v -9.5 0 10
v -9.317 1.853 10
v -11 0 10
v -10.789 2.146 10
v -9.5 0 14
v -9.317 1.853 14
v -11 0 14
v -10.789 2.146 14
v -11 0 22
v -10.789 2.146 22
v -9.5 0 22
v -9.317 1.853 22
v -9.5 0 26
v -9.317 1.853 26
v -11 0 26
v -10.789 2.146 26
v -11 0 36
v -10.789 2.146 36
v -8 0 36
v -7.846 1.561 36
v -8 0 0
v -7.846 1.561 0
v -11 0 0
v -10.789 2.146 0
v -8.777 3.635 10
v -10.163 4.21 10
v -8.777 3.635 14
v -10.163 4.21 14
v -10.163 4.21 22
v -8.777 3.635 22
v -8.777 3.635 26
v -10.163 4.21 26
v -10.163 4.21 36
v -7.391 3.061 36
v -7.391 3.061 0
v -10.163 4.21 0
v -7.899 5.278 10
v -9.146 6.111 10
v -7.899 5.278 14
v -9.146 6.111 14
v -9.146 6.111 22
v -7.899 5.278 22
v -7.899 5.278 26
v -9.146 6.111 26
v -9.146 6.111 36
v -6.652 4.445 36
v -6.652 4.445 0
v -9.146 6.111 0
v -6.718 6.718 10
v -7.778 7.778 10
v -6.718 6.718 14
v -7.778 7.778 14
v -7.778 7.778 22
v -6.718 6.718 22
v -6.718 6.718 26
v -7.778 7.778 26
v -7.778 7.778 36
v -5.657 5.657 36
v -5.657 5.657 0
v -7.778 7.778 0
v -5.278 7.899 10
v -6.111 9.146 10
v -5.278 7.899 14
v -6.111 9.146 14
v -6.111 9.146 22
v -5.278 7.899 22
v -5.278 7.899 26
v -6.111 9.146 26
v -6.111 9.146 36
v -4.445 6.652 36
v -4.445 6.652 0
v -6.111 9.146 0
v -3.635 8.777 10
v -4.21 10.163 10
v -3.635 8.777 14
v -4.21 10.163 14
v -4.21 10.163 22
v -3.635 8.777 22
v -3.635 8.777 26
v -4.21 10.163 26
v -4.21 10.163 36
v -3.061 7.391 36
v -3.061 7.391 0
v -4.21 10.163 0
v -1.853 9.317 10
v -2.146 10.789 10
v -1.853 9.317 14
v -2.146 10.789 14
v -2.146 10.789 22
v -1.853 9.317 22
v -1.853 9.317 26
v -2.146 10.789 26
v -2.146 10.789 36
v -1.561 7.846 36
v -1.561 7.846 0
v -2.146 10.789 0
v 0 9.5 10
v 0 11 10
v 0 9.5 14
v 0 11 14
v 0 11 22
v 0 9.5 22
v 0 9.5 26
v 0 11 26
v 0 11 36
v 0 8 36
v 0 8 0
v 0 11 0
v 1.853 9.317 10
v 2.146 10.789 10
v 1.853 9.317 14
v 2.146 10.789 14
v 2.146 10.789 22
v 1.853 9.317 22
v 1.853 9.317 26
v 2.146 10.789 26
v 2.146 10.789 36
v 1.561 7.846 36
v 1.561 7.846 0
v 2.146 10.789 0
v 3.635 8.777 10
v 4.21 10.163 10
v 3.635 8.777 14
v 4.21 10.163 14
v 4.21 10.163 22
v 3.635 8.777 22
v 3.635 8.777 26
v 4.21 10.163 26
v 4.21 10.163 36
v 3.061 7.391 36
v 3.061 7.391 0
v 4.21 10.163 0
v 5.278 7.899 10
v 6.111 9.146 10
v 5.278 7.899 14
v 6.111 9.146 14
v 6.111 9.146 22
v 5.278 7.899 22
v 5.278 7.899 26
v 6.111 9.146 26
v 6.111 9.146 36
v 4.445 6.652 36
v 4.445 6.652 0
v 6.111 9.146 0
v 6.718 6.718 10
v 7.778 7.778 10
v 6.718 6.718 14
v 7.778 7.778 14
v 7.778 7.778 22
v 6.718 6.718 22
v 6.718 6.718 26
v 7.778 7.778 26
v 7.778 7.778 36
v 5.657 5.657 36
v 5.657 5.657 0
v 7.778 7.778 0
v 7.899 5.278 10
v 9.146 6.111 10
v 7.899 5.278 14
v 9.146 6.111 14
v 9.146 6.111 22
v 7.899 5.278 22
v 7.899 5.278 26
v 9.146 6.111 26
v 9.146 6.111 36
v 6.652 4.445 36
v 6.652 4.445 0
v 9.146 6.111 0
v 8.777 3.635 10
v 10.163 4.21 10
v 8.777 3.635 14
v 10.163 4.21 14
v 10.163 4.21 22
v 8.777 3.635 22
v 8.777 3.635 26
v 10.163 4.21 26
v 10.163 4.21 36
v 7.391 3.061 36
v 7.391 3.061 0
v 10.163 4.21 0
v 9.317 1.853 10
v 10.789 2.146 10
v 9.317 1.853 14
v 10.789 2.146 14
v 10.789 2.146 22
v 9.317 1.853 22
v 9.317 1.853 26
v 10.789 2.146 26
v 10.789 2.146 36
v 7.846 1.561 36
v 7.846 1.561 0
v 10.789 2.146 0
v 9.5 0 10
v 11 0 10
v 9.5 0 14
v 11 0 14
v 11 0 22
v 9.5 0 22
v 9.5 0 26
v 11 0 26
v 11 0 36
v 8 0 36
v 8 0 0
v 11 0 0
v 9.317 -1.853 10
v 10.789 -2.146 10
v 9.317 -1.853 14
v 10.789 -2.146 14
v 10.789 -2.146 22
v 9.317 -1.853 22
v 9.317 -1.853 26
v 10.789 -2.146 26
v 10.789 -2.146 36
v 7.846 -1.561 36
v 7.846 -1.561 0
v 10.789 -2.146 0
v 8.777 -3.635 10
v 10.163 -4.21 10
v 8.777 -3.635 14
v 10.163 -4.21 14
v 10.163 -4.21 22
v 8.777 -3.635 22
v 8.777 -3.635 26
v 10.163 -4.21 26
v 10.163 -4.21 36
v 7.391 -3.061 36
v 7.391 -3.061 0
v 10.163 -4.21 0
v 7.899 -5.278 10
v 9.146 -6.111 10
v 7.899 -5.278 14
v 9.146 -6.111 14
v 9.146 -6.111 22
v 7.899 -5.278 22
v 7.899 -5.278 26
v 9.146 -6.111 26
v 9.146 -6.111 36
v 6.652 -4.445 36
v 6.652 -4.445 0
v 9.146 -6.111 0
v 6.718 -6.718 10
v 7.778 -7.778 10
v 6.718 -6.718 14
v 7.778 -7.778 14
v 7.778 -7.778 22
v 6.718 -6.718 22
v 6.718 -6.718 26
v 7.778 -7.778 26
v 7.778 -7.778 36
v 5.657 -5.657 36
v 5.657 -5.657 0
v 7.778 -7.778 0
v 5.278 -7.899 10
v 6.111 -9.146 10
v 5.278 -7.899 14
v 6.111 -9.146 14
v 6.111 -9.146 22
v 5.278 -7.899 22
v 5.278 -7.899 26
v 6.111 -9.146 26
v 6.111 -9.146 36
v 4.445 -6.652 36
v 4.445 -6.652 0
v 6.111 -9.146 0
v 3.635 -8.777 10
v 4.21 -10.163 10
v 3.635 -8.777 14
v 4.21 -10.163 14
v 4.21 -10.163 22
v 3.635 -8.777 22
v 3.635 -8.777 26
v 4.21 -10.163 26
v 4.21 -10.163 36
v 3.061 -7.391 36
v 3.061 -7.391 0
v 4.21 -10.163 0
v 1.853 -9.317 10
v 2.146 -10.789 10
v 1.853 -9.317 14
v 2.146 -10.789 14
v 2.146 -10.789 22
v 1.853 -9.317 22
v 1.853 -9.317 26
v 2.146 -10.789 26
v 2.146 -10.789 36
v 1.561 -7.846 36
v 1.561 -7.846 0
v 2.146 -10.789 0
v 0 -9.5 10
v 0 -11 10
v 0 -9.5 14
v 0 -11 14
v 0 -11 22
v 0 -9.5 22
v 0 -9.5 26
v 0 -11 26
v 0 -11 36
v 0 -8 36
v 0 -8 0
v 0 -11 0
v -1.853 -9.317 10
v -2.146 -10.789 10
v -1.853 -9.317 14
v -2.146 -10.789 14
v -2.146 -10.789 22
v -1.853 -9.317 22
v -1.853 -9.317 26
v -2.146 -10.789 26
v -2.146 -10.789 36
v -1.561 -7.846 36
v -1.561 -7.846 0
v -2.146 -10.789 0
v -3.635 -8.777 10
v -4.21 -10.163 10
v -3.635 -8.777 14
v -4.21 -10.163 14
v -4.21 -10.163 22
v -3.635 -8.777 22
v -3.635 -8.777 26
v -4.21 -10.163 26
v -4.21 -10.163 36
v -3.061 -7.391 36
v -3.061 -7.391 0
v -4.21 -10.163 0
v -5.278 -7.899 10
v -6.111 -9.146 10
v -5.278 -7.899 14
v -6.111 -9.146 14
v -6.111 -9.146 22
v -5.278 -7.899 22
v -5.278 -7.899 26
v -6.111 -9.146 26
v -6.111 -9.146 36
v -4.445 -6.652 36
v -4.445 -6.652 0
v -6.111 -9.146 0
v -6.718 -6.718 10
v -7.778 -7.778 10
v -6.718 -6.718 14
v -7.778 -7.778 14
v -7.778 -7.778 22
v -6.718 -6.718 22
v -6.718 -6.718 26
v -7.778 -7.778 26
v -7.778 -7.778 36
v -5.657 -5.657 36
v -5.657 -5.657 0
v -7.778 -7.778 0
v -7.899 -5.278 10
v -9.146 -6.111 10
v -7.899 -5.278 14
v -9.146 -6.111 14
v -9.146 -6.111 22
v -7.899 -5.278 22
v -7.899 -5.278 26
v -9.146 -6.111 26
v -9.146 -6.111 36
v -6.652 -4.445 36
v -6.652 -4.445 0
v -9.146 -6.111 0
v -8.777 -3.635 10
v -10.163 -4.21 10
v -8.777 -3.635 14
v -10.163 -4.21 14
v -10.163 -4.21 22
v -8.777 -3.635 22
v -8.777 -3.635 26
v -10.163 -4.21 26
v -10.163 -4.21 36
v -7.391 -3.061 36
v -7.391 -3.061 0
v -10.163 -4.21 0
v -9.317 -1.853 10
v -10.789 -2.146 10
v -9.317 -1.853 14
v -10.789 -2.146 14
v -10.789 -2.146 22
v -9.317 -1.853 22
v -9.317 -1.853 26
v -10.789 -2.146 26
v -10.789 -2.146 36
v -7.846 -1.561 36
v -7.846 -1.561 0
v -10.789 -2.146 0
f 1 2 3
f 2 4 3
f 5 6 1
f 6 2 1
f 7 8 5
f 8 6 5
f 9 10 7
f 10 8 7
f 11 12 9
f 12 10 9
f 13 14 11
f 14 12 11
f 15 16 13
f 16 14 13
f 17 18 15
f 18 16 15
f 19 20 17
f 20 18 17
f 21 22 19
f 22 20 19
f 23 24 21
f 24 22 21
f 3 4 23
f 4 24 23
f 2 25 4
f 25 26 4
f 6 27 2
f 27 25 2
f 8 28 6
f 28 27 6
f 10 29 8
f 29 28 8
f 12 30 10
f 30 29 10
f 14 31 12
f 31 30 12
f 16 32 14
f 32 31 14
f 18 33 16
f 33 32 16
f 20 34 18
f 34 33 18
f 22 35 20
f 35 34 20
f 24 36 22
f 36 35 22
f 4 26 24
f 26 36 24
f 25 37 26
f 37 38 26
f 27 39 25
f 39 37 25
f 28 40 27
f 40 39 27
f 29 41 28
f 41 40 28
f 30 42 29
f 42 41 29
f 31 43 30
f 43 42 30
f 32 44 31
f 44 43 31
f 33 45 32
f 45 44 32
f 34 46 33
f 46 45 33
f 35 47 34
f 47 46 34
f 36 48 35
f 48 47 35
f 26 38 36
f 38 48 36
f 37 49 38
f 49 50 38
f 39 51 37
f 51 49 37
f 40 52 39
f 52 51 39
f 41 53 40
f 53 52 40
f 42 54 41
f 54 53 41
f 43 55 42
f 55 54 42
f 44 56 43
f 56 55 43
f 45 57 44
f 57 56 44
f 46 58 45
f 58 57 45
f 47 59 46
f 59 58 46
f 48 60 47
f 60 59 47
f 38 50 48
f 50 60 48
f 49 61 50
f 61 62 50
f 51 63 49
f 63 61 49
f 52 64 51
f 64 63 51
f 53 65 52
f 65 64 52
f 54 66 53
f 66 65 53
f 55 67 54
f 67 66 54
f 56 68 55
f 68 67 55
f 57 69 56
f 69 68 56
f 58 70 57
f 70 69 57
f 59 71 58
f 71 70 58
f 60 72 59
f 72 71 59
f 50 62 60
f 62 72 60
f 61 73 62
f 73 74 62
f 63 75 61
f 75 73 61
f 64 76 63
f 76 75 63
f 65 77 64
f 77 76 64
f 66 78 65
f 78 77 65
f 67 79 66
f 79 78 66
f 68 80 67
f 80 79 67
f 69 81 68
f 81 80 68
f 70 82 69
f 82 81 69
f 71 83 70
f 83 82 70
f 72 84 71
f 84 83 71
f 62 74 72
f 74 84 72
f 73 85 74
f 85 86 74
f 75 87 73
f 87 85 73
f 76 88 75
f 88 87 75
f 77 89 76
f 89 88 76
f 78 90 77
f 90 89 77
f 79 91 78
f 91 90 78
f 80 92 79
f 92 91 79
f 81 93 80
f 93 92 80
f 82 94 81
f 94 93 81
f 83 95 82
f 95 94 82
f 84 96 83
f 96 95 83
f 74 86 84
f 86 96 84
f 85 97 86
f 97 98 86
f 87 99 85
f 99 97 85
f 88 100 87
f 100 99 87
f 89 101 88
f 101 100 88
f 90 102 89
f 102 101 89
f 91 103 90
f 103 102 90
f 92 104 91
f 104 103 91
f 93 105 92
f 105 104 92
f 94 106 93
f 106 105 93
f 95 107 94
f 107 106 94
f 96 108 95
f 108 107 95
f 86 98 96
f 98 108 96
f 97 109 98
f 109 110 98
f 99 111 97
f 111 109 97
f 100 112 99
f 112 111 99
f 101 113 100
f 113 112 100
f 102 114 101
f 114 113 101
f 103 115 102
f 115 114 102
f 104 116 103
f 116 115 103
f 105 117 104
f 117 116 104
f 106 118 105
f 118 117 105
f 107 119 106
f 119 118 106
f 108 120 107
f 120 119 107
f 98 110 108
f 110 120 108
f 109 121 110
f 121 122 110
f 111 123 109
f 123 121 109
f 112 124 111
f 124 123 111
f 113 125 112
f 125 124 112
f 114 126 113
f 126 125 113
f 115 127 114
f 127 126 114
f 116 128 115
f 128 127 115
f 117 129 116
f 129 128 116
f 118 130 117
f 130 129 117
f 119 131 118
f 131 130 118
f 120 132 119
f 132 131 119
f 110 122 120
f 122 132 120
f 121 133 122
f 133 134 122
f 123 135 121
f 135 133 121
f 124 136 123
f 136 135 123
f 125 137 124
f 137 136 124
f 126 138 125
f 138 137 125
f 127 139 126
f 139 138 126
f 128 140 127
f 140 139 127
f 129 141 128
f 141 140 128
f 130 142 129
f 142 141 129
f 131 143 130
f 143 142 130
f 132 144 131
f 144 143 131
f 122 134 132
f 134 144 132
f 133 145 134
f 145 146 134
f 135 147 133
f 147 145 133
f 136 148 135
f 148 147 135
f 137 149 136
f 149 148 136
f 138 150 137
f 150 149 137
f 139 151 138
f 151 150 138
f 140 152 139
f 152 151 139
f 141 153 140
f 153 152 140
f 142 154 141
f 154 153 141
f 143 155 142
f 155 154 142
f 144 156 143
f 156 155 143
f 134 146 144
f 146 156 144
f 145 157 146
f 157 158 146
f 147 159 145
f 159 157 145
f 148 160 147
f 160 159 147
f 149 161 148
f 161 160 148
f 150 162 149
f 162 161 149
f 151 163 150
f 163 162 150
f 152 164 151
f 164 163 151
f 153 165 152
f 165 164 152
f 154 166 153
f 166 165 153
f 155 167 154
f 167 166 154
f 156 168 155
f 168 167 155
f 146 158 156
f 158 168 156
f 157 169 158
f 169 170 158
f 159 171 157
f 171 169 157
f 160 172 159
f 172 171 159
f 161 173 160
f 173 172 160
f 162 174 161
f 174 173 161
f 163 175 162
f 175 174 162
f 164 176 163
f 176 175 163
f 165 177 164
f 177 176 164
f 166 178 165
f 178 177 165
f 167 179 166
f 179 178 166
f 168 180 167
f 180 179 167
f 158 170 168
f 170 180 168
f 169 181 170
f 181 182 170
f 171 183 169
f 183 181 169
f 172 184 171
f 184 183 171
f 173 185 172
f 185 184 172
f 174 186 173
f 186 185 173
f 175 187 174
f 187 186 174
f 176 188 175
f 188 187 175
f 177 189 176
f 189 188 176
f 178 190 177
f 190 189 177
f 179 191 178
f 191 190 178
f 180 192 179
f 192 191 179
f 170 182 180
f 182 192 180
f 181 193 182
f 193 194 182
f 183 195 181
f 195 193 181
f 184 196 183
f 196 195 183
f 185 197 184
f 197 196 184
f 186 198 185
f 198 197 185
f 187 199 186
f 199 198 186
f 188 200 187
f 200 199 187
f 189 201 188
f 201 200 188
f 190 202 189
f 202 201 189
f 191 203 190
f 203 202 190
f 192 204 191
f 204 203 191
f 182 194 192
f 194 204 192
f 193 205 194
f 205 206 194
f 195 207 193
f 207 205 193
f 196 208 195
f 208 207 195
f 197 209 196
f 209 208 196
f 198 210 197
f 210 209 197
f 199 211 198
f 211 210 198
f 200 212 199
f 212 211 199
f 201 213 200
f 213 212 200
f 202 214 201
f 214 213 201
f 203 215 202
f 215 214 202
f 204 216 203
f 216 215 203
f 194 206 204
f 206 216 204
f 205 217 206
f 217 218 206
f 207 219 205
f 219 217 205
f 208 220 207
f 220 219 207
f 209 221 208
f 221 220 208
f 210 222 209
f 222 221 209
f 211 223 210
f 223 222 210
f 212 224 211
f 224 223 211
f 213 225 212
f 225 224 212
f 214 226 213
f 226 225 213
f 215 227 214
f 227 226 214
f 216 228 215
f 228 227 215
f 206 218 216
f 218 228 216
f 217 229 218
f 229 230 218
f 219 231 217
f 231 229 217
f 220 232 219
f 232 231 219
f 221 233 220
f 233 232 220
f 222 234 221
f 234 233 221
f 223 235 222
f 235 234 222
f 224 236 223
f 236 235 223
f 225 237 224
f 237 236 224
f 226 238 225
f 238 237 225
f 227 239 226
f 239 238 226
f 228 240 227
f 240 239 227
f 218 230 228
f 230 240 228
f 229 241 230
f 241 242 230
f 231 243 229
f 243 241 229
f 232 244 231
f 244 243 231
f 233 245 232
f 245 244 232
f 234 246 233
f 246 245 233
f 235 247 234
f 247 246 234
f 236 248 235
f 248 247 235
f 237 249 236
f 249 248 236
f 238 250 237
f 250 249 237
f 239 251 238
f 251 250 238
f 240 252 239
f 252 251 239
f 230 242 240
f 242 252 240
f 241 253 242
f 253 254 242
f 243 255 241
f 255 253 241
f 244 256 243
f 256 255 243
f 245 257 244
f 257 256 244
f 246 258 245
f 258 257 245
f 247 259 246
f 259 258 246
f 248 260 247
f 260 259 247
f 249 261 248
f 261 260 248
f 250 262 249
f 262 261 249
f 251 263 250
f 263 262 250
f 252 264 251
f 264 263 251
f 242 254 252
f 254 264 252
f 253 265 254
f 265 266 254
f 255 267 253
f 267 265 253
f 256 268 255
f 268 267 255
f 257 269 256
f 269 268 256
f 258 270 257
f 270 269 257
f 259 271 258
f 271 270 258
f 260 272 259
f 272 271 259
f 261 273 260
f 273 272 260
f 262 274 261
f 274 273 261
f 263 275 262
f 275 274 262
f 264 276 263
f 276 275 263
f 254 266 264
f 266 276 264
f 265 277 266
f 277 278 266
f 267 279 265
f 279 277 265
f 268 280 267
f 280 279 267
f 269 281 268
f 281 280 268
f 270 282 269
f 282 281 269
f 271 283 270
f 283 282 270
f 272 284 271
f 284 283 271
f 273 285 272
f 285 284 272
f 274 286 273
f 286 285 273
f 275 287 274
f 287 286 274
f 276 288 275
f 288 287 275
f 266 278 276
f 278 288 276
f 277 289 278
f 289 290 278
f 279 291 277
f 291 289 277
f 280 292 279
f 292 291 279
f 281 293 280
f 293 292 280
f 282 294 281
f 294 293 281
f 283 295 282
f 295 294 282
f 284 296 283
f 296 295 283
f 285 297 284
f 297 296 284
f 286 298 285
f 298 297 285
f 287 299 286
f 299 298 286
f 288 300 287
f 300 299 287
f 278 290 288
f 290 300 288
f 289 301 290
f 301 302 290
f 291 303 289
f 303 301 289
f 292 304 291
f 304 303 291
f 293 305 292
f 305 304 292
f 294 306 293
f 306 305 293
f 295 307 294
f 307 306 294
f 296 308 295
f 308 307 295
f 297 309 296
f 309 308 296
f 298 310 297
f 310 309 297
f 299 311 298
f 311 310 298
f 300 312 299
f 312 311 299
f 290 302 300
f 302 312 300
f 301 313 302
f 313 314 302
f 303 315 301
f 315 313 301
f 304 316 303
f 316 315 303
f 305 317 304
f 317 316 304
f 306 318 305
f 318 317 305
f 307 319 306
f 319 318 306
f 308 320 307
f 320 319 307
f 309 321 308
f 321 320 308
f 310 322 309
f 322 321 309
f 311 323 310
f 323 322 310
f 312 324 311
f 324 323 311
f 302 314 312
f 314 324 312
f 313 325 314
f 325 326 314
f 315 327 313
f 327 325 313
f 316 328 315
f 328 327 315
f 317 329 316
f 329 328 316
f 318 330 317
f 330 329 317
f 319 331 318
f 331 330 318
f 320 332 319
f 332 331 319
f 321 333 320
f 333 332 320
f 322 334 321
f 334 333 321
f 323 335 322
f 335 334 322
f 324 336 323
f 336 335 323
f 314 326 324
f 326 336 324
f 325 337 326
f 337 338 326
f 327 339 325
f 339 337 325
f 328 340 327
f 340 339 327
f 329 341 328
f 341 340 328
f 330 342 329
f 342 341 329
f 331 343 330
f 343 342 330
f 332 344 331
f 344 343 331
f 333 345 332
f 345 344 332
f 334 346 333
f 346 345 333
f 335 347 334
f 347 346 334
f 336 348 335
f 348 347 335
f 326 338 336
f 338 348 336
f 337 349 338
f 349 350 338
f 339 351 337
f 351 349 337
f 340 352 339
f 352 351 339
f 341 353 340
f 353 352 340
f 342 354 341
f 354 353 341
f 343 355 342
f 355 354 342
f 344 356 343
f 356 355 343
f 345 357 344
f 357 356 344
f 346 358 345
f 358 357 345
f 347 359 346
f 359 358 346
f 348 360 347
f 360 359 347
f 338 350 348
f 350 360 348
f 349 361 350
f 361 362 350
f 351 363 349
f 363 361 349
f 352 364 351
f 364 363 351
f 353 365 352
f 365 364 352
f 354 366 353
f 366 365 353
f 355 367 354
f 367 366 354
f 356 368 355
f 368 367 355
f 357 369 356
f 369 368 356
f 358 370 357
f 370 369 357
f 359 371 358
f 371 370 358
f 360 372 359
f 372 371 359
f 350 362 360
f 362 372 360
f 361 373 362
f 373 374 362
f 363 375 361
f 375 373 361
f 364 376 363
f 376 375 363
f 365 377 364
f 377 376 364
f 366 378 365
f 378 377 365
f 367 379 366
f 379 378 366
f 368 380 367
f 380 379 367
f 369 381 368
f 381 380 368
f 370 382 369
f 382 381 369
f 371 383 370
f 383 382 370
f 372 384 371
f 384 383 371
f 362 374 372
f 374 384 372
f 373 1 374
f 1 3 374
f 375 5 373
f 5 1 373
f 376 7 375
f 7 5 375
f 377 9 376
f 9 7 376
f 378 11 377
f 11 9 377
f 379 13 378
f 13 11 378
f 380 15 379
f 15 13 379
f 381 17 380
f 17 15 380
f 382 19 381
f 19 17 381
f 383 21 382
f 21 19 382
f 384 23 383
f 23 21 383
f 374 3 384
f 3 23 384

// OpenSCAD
$fn = 32;

// ----------------------------------------------------------------------
// Grooved revolve: plain_grooves, bore R8
// ----------------------------------------------------------------------

// --- parameters (mm) ---
bore_r = 8;               // bore radius
outer_r = 11;             // outer radius of the body
total_h = 36;             // overall height, Z
wall = 3;                 // radial wall thickness
groove_w = 4;             // groove width
groove_d = 1.5;           // groove depth
grooves = 2;              // number of outer grooves

bbox_x = 2 * outer_r;  // full diameter
bore_d = 2 * bore_r;  // bore diameter
body_d = 2 * outer_r;  // body diameter
revolve_angle = 360;  // full turn around the Z axis

profile = [[8, 0], [11, 0], [11, 10], [9.5, 10], [9.5, 14], [11, 14], [11, 22], [9.5, 22], [9.5, 26], [11, 26], [11, 36], [8, 36]];  // primary outline, 12 points, counter clockwise

// --- the one profile operation ---
rotate_extrude(angle = revolve_angle) polygon(points = profile);
